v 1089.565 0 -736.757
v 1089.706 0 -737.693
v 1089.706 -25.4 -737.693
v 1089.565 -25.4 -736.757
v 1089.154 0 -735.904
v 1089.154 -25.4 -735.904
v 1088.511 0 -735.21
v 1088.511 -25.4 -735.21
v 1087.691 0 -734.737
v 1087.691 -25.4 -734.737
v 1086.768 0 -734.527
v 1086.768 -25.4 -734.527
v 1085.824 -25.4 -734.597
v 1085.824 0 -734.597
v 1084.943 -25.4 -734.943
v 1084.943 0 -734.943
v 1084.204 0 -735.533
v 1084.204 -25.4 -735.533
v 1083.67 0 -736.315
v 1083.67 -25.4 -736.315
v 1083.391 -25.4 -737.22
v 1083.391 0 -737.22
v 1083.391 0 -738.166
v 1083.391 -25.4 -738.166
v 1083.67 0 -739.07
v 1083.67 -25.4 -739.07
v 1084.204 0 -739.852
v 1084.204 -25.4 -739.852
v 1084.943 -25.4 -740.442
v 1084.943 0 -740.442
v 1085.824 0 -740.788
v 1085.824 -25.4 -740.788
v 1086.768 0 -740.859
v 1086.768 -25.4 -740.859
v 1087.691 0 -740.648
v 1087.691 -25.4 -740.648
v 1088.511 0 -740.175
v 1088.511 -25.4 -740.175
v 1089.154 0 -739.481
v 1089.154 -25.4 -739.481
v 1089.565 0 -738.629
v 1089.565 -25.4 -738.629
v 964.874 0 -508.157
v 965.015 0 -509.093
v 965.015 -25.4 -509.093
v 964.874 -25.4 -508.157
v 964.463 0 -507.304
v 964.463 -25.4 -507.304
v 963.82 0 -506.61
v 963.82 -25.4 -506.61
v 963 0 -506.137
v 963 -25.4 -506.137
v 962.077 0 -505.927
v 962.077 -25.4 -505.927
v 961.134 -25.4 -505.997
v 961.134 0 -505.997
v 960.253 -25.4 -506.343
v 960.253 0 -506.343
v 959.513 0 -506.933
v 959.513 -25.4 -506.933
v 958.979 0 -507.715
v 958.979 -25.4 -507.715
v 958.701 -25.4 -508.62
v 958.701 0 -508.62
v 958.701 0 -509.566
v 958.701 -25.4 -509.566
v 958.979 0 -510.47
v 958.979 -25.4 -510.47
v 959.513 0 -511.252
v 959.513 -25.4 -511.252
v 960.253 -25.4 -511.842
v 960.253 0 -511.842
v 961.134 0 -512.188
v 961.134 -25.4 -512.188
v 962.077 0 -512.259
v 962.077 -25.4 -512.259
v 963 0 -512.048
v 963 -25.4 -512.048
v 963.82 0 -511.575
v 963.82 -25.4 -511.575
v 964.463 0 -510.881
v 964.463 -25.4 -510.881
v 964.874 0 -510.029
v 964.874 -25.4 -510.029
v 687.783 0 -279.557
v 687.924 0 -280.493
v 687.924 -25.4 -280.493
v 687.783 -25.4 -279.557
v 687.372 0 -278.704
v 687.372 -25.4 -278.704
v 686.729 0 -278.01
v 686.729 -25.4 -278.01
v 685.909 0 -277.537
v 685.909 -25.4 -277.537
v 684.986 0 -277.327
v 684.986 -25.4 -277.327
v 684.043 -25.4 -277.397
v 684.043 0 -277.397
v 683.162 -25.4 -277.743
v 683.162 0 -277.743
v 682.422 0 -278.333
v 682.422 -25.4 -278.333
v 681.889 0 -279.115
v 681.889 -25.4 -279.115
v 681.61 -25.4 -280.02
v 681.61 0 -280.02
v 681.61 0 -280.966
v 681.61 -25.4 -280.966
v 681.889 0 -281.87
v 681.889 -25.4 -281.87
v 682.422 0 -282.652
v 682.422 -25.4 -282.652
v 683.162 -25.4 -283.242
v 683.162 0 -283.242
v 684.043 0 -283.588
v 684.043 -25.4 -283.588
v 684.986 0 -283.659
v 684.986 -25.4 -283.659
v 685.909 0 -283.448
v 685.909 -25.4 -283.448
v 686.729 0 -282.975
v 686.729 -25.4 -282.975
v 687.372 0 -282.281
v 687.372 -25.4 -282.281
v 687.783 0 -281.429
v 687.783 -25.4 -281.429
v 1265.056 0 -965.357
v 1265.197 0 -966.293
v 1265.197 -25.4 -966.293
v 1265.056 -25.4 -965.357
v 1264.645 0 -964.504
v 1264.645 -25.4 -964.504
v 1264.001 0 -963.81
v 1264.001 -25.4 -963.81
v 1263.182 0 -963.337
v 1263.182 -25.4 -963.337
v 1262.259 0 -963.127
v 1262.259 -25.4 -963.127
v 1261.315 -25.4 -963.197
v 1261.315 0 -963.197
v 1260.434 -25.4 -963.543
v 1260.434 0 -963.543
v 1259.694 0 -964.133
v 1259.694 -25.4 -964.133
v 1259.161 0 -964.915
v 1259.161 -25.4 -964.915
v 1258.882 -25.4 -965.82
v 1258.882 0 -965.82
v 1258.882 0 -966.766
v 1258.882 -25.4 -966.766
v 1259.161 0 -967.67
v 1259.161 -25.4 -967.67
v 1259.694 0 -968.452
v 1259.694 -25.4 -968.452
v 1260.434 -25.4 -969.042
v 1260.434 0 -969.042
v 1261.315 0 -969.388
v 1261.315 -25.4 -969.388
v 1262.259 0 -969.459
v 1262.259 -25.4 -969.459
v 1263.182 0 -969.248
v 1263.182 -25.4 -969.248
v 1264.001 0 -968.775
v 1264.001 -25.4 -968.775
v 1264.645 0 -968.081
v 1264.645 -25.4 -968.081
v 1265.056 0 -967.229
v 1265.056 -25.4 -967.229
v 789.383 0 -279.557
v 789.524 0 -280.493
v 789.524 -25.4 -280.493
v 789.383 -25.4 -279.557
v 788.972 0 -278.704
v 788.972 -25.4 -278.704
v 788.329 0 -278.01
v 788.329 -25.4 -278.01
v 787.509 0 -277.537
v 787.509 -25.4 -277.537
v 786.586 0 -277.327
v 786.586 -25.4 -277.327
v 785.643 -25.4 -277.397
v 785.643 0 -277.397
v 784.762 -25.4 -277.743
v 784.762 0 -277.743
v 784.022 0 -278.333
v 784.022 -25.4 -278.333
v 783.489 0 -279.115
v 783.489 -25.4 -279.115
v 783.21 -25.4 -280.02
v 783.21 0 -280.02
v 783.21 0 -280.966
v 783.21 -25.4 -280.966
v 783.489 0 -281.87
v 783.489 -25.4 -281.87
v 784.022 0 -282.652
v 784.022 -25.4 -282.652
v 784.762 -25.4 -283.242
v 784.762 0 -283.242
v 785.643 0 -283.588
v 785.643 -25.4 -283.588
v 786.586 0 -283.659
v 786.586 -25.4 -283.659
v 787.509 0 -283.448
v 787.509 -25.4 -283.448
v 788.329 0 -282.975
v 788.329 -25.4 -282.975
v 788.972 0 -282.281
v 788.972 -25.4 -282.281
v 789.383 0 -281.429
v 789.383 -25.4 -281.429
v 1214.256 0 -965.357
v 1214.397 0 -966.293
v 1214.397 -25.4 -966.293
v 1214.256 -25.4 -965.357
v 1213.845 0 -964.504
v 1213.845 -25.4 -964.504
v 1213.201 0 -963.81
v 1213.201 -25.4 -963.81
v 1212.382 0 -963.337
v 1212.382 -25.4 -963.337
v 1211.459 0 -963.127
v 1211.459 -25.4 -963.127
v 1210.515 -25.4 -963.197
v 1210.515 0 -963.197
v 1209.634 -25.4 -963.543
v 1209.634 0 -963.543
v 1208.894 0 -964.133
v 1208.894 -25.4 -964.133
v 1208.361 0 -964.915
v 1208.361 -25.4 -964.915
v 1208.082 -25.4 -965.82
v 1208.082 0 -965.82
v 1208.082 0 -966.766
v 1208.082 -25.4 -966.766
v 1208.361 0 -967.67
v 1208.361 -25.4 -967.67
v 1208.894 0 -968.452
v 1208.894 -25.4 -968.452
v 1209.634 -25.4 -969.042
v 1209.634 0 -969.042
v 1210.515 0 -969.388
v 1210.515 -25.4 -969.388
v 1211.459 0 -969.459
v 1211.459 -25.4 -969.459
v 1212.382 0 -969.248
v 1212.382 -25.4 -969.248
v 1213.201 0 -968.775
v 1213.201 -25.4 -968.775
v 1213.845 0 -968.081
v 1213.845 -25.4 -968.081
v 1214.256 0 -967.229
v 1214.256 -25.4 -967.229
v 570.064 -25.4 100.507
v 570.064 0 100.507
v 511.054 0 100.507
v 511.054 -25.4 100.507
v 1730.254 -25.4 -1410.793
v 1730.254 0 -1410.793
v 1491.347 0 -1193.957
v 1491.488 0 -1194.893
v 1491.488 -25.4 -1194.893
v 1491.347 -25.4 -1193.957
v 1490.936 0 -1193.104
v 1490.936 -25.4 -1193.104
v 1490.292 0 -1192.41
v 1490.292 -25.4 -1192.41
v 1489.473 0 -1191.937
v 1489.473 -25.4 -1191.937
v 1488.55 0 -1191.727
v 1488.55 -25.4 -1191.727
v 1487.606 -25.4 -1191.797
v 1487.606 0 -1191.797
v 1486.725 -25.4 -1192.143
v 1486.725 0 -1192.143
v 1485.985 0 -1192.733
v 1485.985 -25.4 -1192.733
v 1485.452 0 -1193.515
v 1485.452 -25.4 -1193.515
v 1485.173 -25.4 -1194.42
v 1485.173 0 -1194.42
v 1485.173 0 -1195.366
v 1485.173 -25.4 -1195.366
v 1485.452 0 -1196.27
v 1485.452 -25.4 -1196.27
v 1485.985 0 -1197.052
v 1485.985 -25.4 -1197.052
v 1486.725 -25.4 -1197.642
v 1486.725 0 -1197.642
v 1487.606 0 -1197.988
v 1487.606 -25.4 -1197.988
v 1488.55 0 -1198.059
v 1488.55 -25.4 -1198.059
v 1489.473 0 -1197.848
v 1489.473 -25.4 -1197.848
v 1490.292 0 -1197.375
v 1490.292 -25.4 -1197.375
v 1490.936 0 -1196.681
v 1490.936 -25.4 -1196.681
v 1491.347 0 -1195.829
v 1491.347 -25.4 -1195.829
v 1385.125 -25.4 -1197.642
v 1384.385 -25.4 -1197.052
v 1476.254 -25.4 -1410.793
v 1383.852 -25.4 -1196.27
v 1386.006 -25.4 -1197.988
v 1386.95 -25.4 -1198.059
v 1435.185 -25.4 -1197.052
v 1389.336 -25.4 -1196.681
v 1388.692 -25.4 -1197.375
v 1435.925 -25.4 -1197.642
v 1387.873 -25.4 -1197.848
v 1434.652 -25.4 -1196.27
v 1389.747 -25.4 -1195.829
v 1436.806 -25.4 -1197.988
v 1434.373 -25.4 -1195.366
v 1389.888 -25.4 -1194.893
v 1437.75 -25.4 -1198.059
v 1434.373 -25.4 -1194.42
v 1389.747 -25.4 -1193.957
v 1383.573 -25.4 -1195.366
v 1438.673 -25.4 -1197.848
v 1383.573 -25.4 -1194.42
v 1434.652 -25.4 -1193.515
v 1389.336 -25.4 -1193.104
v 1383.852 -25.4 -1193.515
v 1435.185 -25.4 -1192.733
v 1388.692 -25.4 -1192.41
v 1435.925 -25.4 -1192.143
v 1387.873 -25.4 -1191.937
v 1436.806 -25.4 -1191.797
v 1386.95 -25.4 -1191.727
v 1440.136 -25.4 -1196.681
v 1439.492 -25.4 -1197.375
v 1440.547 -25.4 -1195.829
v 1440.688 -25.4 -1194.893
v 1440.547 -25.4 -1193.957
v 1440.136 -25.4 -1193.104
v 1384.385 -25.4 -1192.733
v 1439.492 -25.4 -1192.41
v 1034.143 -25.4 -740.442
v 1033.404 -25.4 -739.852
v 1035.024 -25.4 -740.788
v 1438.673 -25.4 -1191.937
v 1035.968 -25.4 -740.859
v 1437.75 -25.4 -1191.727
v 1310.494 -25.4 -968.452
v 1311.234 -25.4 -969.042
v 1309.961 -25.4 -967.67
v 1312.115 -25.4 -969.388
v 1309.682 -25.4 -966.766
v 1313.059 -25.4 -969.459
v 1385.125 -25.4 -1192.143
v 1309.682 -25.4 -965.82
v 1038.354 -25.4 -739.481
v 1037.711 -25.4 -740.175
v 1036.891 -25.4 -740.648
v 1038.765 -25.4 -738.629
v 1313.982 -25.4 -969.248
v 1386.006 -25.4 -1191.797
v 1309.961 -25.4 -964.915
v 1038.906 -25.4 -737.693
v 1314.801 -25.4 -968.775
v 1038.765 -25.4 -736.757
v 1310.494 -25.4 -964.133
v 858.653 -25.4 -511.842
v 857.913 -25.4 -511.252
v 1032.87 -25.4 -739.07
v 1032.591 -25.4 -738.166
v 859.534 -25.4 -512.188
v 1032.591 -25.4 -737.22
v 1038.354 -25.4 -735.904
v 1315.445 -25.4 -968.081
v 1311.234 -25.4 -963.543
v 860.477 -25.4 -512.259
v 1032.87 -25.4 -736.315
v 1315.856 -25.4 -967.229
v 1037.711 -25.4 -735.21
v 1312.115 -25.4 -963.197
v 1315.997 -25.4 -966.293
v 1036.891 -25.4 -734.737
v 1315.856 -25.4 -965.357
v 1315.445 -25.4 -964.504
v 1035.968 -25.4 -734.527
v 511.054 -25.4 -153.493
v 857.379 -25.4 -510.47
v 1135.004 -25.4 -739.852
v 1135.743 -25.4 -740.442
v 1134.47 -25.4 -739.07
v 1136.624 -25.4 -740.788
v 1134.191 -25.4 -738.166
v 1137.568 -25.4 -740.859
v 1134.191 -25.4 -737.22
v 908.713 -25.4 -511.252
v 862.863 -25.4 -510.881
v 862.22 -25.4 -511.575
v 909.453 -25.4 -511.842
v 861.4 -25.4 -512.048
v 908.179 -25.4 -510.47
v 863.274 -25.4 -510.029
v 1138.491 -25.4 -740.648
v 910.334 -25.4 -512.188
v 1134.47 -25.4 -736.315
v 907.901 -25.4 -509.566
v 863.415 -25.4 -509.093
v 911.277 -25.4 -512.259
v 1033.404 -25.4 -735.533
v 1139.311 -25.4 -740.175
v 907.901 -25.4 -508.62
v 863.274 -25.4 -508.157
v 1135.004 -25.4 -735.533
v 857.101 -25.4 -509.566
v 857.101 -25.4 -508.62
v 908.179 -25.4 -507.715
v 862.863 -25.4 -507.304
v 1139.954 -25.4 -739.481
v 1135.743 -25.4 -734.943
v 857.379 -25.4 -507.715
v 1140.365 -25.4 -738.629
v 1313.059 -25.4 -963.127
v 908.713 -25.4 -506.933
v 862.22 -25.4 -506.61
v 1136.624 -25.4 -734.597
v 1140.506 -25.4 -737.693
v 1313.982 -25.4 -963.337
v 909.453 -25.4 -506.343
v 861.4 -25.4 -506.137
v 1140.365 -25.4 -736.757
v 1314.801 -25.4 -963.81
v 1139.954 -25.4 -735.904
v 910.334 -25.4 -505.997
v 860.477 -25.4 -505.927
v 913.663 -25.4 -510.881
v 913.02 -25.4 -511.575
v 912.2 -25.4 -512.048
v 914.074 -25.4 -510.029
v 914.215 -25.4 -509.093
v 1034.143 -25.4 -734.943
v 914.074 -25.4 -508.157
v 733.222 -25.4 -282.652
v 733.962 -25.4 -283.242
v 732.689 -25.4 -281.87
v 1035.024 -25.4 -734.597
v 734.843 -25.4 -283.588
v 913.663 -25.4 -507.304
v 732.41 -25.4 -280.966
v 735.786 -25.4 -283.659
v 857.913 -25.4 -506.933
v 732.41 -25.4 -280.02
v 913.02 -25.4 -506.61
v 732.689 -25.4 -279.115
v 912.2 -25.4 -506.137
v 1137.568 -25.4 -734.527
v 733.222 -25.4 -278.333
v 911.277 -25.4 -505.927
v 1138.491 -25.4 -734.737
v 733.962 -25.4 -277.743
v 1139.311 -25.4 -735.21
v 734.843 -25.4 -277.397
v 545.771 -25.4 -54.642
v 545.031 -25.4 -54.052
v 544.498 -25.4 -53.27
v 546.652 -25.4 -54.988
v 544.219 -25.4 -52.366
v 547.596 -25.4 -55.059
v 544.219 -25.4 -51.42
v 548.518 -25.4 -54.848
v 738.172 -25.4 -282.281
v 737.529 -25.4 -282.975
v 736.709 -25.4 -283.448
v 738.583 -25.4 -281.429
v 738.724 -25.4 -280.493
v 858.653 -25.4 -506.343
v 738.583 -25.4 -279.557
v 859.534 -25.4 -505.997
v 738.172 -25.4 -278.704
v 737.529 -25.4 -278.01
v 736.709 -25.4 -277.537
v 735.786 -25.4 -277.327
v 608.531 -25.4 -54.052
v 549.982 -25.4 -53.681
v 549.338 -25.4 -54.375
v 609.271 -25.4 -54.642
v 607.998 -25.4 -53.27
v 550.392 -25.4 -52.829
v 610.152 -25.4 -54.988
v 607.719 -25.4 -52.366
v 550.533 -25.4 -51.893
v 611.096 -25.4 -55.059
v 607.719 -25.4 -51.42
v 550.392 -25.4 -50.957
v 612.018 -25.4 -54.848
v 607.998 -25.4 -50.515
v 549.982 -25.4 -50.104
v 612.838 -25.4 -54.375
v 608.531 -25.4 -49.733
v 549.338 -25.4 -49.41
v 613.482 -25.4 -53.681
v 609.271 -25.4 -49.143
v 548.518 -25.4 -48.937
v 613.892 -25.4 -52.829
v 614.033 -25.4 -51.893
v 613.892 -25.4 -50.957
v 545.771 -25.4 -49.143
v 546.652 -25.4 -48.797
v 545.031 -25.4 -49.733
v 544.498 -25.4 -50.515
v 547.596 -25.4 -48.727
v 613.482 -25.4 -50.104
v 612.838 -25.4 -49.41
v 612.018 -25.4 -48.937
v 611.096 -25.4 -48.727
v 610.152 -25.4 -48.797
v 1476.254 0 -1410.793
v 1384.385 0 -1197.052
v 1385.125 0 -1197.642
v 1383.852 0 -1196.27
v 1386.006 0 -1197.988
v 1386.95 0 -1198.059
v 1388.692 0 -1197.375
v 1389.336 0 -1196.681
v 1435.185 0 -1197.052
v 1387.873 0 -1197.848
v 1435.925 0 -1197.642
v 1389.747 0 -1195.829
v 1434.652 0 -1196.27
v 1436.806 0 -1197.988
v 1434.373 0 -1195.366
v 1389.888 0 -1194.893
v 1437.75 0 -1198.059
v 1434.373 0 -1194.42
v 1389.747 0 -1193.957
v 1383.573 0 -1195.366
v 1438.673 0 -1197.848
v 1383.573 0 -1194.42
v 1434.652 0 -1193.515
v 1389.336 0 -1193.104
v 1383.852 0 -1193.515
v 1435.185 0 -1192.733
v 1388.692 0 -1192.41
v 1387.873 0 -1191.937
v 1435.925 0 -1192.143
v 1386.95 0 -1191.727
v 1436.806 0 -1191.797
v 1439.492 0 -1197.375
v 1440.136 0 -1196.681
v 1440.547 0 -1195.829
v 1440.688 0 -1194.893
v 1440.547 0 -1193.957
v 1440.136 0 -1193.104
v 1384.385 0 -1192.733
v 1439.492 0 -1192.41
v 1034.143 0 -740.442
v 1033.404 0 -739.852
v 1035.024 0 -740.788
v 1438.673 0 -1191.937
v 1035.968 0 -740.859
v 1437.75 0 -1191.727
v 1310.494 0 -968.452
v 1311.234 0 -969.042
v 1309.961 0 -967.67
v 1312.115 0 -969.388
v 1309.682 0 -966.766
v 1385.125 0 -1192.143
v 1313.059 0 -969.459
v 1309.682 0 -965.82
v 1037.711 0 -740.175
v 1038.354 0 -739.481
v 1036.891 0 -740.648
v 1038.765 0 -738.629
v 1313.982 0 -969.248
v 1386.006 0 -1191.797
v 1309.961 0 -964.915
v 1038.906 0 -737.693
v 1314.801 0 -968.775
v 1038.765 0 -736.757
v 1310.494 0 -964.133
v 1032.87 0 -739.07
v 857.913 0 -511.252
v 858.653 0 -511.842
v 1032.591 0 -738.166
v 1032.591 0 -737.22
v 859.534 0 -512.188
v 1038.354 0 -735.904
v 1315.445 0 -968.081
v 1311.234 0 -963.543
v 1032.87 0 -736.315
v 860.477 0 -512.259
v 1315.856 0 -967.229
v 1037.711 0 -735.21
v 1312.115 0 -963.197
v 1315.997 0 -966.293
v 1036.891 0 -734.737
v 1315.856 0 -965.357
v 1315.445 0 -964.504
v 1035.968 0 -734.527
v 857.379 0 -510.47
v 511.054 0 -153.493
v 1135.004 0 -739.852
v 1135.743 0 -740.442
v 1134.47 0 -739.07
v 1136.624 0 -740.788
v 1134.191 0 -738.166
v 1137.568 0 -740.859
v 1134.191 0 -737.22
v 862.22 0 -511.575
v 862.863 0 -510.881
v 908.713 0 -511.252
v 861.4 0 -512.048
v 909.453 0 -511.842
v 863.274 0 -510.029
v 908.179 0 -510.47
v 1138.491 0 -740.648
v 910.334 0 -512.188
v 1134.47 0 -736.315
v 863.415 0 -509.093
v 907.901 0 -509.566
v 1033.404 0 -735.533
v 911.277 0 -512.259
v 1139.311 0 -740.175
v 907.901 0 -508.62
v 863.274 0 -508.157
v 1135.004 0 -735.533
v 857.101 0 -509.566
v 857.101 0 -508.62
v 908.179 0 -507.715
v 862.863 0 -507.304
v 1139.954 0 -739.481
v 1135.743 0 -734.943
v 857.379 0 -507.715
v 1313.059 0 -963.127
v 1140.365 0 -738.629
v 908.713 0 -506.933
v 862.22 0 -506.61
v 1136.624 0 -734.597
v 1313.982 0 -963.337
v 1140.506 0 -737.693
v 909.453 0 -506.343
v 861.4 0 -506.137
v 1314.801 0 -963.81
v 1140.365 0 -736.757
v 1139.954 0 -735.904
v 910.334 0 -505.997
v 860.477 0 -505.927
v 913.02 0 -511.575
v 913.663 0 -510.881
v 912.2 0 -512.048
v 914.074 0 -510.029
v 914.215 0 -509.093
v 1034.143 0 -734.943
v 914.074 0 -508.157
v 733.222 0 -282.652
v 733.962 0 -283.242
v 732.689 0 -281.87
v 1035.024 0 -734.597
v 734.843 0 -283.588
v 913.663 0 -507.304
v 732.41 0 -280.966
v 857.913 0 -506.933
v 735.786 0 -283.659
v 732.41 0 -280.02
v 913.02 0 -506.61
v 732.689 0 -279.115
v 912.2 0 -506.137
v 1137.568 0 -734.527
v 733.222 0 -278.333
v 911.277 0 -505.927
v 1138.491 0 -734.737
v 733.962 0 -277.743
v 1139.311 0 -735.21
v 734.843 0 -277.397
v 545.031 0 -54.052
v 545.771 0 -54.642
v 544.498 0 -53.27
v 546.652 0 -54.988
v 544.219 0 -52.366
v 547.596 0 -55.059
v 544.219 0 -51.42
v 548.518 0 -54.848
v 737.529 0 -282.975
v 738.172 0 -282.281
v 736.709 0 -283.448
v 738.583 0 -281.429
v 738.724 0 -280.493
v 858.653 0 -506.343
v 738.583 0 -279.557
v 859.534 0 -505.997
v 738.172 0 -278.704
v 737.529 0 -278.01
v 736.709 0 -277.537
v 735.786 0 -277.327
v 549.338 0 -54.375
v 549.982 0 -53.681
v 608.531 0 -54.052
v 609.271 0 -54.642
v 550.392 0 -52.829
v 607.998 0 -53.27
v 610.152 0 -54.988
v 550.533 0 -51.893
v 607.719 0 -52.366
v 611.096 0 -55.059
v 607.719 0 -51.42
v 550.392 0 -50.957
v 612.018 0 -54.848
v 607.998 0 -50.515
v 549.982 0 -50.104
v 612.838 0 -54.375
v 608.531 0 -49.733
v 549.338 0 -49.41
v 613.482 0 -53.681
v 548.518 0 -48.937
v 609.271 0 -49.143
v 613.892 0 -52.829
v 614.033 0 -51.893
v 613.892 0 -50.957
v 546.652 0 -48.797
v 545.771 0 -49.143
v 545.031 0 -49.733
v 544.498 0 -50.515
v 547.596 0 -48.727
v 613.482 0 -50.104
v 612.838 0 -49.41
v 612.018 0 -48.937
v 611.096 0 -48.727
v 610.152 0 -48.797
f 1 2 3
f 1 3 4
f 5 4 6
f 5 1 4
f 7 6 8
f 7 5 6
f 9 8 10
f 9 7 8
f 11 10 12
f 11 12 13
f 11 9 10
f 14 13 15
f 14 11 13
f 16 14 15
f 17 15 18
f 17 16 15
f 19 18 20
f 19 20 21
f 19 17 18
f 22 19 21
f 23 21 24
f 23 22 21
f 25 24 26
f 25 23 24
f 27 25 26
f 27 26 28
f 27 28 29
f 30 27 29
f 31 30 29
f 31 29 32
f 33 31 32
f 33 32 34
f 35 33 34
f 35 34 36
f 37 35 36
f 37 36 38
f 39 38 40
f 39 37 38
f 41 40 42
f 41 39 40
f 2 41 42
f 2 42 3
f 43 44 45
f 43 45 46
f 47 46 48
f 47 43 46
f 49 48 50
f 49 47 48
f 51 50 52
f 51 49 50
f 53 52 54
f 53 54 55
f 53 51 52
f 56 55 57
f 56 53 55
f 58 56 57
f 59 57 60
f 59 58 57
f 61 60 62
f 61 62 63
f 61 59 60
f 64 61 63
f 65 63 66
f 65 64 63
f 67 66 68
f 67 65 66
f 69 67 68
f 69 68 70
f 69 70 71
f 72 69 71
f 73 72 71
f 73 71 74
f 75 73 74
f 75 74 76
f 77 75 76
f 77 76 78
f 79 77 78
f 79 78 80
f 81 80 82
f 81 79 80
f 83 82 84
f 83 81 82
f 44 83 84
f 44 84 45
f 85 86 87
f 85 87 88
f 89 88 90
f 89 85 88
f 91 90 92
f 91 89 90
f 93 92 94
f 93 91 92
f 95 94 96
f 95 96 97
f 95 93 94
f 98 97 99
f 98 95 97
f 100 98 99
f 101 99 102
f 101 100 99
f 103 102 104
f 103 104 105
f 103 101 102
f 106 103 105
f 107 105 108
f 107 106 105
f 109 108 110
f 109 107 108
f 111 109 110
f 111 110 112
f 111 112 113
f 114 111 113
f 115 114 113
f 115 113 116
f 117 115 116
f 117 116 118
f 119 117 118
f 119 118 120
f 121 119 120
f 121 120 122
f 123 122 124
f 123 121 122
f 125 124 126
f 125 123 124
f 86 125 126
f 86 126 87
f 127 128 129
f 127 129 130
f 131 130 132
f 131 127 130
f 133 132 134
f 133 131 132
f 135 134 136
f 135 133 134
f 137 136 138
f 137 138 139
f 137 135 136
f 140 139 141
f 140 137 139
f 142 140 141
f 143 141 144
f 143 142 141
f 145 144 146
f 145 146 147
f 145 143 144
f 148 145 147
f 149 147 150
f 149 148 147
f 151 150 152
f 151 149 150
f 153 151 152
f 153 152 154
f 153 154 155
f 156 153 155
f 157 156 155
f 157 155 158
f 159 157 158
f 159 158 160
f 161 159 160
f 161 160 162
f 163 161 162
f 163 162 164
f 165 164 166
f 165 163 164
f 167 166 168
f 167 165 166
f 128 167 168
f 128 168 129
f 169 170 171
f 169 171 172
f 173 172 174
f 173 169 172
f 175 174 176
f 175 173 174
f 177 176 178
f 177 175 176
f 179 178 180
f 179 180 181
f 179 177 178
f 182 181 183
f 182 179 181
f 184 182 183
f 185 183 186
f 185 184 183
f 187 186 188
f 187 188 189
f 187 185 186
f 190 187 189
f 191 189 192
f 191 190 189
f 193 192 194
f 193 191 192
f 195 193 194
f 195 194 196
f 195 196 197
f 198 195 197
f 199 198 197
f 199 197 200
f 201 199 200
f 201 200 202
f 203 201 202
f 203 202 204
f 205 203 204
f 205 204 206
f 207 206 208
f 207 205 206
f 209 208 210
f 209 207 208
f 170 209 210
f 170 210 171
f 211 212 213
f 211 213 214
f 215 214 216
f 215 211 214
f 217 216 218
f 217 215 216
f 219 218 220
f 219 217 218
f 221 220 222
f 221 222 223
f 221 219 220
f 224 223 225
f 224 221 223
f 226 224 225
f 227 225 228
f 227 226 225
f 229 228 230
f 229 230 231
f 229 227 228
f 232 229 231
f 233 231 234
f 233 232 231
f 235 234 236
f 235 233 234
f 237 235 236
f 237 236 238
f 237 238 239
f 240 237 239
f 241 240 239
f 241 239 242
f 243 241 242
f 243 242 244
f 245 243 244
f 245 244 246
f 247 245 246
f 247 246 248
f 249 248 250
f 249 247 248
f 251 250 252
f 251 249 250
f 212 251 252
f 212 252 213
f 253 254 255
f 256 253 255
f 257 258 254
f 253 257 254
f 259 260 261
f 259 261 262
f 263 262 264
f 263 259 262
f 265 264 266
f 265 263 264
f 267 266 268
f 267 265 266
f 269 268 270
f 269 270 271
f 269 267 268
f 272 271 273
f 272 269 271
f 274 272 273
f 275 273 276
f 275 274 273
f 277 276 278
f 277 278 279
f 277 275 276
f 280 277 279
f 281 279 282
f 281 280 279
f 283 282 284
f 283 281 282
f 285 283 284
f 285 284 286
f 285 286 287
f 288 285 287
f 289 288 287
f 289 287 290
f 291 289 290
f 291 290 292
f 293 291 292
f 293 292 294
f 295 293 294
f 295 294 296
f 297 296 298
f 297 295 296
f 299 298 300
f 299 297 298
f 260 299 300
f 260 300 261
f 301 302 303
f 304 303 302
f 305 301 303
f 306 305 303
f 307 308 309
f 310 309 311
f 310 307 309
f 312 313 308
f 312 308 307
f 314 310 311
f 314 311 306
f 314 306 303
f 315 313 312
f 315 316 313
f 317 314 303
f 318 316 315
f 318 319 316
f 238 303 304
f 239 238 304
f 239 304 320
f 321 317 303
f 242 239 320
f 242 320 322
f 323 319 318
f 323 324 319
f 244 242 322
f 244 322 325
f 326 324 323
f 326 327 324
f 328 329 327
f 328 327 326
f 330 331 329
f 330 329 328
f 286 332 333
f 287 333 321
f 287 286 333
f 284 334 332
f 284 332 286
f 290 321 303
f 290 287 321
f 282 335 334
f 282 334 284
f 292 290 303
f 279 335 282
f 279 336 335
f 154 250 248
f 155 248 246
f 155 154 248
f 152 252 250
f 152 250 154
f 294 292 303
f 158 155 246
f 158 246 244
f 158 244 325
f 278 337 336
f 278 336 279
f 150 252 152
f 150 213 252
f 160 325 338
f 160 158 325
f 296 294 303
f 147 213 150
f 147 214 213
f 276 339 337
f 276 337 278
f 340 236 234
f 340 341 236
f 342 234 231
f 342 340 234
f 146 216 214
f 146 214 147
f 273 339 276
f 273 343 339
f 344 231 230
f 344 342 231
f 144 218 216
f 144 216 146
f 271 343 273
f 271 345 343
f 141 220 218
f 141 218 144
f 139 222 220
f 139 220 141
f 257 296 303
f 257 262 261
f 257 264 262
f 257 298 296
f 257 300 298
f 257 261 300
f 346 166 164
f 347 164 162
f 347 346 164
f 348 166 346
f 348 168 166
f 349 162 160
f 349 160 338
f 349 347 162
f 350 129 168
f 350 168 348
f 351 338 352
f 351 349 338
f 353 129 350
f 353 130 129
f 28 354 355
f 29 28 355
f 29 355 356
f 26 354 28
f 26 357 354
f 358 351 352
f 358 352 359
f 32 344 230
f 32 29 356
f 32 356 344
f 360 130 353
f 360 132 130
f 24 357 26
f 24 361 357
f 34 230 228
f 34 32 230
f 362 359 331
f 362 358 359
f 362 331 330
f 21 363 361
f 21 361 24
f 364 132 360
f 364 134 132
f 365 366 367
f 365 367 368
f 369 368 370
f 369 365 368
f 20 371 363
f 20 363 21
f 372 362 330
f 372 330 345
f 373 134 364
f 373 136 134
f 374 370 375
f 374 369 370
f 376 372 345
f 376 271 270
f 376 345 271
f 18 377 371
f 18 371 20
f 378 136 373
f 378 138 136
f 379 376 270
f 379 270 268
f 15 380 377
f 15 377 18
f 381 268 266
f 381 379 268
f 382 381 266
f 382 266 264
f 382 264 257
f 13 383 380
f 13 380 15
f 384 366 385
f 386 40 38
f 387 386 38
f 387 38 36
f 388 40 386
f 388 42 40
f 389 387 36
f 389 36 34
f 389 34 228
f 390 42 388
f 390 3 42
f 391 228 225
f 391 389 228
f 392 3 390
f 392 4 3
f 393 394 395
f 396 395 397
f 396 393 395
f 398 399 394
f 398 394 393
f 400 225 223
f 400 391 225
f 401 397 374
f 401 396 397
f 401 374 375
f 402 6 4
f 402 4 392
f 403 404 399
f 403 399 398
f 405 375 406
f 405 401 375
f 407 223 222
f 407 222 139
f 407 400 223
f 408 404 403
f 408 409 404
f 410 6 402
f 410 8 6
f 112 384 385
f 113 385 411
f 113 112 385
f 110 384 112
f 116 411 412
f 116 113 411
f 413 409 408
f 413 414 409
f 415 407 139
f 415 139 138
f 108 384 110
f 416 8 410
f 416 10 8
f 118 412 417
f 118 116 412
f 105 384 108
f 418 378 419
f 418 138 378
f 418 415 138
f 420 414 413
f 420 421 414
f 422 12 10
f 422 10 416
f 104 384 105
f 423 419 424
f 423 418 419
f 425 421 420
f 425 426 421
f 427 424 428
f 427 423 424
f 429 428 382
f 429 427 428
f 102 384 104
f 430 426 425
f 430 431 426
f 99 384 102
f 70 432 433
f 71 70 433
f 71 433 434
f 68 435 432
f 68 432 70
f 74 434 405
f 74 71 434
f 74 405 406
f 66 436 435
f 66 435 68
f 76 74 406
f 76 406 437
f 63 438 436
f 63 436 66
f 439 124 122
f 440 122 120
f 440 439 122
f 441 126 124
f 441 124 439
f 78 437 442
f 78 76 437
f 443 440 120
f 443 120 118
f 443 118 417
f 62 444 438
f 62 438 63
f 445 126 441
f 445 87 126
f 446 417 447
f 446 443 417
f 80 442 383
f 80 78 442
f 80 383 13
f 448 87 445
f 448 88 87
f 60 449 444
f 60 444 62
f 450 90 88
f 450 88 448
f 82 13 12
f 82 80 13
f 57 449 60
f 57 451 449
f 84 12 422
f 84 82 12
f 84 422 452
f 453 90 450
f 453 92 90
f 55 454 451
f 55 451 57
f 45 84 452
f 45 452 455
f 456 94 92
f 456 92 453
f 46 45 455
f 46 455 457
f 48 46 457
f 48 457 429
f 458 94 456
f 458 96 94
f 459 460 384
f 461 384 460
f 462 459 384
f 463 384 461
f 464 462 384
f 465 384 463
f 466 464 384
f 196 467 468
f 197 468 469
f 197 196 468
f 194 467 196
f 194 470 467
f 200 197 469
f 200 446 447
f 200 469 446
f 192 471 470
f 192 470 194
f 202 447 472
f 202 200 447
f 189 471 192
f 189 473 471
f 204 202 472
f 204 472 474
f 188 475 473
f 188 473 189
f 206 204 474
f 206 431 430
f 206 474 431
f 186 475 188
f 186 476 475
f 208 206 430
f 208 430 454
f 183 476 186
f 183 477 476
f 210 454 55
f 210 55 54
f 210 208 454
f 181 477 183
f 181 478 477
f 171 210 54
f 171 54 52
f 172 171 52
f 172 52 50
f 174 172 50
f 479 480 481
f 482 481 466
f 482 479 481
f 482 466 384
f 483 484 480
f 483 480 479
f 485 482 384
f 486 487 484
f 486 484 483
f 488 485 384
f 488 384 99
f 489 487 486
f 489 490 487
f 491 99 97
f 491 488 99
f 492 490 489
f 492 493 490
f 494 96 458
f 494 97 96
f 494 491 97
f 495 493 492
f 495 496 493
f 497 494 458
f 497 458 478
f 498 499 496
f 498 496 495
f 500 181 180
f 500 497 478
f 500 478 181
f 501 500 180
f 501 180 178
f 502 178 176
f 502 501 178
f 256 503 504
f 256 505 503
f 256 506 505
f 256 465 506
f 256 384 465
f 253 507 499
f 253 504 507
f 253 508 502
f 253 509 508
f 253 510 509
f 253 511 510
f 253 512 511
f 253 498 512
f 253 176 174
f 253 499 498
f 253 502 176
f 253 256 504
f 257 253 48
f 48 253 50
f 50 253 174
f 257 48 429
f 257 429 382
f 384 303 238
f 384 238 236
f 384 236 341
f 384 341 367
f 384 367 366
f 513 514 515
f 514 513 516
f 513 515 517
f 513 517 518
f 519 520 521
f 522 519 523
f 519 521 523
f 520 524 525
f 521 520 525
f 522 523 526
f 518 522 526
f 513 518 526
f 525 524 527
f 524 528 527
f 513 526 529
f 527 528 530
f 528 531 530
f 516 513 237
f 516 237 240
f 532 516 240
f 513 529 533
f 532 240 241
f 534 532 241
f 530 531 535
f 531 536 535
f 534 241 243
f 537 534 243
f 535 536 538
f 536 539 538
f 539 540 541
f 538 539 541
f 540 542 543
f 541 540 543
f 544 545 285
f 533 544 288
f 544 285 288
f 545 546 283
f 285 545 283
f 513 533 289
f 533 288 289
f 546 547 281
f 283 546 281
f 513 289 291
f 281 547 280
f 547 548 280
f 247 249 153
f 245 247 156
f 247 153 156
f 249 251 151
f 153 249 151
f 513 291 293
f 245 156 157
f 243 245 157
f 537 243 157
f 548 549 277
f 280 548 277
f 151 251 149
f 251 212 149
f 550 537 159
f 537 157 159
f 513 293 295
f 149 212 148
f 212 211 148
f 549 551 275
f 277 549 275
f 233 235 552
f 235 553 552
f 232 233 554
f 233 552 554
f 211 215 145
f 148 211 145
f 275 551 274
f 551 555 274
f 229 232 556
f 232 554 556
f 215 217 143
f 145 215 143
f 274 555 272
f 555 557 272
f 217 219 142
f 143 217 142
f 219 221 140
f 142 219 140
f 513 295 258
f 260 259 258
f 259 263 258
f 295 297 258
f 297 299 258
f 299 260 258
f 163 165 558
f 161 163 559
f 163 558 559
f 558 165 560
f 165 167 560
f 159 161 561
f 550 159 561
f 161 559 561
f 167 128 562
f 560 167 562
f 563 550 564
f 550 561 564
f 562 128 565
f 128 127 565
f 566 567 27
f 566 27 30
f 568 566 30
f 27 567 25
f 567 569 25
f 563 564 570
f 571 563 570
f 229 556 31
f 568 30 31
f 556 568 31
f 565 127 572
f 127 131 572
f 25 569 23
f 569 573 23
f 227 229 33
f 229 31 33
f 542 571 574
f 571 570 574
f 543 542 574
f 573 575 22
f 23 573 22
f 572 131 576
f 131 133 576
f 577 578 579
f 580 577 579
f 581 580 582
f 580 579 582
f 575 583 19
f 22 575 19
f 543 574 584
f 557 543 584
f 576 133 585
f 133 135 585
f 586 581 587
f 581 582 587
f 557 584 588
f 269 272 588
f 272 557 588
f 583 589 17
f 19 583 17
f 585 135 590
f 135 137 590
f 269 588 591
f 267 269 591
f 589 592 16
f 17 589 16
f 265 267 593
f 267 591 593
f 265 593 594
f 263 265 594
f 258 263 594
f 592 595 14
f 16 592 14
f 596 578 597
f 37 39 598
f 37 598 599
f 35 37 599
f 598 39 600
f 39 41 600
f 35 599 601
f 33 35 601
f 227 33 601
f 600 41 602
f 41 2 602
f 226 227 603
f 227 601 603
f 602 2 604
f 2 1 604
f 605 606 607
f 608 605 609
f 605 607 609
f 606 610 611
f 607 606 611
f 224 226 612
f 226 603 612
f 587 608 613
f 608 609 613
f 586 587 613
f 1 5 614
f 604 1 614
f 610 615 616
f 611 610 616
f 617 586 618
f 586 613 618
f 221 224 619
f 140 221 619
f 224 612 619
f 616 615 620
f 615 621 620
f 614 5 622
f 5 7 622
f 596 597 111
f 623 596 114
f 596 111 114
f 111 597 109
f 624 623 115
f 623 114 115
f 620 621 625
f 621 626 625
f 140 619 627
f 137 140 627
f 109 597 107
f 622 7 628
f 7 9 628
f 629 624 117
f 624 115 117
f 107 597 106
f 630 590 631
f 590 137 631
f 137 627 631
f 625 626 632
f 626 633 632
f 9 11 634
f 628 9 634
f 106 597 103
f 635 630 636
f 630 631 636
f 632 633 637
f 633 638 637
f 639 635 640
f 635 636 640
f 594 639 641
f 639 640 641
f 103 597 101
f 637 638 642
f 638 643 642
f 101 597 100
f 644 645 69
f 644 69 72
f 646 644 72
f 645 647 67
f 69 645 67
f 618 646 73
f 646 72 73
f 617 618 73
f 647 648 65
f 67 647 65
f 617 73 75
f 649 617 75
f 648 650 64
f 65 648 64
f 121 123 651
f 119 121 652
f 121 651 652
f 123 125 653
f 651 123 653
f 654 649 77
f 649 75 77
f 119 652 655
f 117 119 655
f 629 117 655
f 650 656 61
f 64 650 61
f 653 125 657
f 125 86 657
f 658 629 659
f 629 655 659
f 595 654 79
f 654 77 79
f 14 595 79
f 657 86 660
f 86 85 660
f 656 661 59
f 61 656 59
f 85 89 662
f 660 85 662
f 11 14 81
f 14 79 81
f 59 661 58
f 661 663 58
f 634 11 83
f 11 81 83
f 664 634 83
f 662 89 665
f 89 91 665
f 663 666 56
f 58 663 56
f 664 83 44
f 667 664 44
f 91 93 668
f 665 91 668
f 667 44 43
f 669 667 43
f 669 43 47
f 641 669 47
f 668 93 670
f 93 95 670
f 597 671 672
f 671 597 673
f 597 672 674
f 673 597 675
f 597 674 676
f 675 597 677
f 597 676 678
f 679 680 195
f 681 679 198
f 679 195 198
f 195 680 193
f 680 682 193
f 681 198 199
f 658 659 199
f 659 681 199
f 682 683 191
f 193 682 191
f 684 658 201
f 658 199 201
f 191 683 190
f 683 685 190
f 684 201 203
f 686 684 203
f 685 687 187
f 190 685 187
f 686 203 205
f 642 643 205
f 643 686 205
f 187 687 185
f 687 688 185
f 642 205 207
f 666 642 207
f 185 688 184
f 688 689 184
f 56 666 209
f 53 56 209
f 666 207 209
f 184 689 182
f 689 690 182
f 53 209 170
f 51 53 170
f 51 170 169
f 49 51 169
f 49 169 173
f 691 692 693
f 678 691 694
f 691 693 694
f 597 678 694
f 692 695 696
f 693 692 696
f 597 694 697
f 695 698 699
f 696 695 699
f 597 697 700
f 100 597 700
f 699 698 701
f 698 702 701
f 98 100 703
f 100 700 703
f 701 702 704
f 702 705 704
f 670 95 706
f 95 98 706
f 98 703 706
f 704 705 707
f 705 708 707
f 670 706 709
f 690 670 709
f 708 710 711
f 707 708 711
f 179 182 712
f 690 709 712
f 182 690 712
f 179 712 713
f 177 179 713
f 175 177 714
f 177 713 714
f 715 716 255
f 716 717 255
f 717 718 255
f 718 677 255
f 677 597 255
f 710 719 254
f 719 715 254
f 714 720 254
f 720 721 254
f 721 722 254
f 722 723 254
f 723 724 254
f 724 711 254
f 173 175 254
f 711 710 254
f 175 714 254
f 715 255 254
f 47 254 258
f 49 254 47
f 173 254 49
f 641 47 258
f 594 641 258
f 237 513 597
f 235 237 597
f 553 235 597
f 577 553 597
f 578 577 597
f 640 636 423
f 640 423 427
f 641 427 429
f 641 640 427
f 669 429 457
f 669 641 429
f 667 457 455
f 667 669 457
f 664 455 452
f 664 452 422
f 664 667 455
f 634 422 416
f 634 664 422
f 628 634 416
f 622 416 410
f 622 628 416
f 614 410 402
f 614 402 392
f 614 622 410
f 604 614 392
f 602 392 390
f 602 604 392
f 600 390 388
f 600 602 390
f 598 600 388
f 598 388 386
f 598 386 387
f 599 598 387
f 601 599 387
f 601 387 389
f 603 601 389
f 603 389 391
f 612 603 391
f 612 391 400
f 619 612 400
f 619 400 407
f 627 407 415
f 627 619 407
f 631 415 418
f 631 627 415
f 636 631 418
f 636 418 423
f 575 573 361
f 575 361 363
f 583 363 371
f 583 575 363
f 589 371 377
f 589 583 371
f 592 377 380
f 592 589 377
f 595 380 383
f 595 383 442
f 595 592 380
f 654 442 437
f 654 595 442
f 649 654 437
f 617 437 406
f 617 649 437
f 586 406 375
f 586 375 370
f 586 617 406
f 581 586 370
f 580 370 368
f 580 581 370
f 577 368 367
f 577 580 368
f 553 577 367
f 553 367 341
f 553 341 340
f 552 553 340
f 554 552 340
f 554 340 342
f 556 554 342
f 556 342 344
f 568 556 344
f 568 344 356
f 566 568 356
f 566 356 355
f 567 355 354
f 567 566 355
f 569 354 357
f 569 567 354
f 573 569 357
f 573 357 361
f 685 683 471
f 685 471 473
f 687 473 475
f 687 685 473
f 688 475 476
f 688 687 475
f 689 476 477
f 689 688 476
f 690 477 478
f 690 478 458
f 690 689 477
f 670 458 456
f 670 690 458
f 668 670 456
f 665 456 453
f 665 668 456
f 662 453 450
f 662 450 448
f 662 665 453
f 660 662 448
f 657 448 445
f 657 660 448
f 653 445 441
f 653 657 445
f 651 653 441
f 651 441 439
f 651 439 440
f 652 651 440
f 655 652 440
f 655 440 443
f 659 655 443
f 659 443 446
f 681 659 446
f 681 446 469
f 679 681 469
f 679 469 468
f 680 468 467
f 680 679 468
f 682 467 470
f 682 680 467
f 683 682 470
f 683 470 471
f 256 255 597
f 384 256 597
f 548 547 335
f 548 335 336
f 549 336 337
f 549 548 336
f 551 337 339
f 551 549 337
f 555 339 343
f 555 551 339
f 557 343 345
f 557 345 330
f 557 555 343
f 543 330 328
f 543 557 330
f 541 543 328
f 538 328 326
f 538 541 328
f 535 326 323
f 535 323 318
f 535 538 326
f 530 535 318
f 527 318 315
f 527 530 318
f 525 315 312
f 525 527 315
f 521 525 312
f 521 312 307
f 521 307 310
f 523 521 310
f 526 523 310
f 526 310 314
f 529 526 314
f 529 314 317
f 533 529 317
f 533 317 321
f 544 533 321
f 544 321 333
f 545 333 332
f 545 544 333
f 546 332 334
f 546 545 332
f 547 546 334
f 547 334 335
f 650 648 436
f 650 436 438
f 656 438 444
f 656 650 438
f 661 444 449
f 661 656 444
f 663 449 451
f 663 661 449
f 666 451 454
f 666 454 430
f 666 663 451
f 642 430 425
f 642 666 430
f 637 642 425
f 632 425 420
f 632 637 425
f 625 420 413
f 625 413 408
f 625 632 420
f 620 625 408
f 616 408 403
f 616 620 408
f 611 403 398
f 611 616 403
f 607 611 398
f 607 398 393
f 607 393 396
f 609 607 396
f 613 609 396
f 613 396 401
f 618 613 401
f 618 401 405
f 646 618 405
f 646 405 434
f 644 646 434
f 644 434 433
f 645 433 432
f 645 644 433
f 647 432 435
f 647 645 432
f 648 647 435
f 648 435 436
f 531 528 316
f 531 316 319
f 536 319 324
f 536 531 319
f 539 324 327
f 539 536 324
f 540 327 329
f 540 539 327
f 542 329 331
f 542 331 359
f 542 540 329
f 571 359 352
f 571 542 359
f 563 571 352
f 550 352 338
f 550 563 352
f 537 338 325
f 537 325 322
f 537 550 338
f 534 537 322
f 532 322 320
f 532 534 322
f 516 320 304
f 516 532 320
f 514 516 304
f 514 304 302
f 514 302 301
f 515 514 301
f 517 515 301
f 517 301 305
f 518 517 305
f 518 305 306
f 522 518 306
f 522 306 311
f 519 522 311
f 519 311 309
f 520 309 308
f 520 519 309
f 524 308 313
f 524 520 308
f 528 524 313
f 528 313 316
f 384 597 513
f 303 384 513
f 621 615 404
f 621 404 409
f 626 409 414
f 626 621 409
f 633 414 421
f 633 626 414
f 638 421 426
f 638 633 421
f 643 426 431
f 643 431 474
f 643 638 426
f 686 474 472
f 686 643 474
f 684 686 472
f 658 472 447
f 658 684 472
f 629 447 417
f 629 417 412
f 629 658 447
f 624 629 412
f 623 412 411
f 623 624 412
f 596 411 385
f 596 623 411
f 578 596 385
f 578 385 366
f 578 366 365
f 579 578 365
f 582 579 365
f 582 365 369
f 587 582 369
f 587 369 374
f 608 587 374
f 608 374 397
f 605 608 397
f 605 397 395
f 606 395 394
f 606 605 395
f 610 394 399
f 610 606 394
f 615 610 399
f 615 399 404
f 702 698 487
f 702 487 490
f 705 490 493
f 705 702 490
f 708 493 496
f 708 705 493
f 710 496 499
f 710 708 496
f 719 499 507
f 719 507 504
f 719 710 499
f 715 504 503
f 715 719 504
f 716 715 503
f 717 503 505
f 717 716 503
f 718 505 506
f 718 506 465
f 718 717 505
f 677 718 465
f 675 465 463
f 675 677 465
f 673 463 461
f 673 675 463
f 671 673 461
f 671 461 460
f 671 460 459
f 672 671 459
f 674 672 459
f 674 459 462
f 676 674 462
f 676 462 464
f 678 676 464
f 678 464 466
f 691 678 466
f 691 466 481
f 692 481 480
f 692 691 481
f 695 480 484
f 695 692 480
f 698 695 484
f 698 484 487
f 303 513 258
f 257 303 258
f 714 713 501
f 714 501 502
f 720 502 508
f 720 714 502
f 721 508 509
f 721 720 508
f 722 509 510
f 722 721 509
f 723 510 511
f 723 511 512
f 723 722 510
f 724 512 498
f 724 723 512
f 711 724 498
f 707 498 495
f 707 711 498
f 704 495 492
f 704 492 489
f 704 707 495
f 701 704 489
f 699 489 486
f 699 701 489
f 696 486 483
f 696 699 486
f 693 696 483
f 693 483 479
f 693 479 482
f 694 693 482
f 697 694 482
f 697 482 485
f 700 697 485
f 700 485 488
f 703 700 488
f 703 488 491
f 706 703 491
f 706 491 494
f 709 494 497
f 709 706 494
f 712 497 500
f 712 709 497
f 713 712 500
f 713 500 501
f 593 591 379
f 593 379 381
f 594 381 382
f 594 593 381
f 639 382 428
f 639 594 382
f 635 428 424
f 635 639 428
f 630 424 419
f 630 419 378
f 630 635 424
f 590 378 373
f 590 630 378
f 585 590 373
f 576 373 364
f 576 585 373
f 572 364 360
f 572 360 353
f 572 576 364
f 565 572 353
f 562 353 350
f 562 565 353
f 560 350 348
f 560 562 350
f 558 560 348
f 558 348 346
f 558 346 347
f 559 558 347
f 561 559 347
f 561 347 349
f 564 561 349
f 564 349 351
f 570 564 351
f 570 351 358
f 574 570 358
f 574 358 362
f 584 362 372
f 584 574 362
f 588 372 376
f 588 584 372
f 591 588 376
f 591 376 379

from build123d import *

# Parameters (mm, degrees)
F0_R     = 3.175
F1_DEPTH = 25.4


with BuildPart() as f1:
    # F0 (on Front) → F1 (new body)
    with BuildSketch(Plane.XZ):
        Polygon((1476.254213, -1410.792774), (1730.254213, -1410.792774), (570.064314, 100.507226), (511.054213, 100.507226), (511.054213, -153.492774), align=None)
        with Locations((1035.730981, -737.692774)):
            Circle(F0_R, mode=Mode.SUBTRACT)
        with Locations((1086.530981, -737.692774)):
            Circle(F0_R, mode=Mode.SUBTRACT)
        with Locations((1386.712799, -1194.892774)):
            Circle(F0_R, mode=Mode.SUBTRACT)
        with Locations((1437.512799, -1194.892774)):
            Circle(F0_R, mode=Mode.SUBTRACT)
        with Locations((1488.312799, -1194.892774)):
            Circle(F0_R, mode=Mode.SUBTRACT)
        with Locations((1211.22189, -966.292774)):
            Circle(F0_R, mode=Mode.SUBTRACT)
        with Locations((1262.02189, -966.292774)):
            Circle(F0_R, mode=Mode.SUBTRACT)
        with Locations((1312.82189, -966.292774)):
            Circle(F0_R, mode=Mode.SUBTRACT)
        with Locations((1137.330981, -737.692774)):
            Circle(F0_R, mode=Mode.SUBTRACT)
        with Locations((684.749162, -280.492774)):
            Circle(F0_R, mode=Mode.SUBTRACT)
        with Locations((735.549162, -280.492774)):
            Circle(F0_R, mode=Mode.SUBTRACT)
        with Locations((786.349162, -280.492774)):
            Circle(F0_R, mode=Mode.SUBTRACT)
        with Locations((860.240072, -509.092774)):
            Circle(F0_R, mode=Mode.SUBTRACT)
        with Locations((911.040072, -509.092774)):
            Circle(F0_R, mode=Mode.SUBTRACT)
        with Locations((961.840072, -509.092774)):
            Circle(F0_R, mode=Mode.SUBTRACT)
        with Locations((547.358253, -51.892774)):
            Circle(F0_R, mode=Mode.SUBTRACT)
        with Locations((610.858253, -51.892774)):
            Circle(F0_R, mode=Mode.SUBTRACT)
    extrude(amount=F1_DEPTH)


solid = f1.part
